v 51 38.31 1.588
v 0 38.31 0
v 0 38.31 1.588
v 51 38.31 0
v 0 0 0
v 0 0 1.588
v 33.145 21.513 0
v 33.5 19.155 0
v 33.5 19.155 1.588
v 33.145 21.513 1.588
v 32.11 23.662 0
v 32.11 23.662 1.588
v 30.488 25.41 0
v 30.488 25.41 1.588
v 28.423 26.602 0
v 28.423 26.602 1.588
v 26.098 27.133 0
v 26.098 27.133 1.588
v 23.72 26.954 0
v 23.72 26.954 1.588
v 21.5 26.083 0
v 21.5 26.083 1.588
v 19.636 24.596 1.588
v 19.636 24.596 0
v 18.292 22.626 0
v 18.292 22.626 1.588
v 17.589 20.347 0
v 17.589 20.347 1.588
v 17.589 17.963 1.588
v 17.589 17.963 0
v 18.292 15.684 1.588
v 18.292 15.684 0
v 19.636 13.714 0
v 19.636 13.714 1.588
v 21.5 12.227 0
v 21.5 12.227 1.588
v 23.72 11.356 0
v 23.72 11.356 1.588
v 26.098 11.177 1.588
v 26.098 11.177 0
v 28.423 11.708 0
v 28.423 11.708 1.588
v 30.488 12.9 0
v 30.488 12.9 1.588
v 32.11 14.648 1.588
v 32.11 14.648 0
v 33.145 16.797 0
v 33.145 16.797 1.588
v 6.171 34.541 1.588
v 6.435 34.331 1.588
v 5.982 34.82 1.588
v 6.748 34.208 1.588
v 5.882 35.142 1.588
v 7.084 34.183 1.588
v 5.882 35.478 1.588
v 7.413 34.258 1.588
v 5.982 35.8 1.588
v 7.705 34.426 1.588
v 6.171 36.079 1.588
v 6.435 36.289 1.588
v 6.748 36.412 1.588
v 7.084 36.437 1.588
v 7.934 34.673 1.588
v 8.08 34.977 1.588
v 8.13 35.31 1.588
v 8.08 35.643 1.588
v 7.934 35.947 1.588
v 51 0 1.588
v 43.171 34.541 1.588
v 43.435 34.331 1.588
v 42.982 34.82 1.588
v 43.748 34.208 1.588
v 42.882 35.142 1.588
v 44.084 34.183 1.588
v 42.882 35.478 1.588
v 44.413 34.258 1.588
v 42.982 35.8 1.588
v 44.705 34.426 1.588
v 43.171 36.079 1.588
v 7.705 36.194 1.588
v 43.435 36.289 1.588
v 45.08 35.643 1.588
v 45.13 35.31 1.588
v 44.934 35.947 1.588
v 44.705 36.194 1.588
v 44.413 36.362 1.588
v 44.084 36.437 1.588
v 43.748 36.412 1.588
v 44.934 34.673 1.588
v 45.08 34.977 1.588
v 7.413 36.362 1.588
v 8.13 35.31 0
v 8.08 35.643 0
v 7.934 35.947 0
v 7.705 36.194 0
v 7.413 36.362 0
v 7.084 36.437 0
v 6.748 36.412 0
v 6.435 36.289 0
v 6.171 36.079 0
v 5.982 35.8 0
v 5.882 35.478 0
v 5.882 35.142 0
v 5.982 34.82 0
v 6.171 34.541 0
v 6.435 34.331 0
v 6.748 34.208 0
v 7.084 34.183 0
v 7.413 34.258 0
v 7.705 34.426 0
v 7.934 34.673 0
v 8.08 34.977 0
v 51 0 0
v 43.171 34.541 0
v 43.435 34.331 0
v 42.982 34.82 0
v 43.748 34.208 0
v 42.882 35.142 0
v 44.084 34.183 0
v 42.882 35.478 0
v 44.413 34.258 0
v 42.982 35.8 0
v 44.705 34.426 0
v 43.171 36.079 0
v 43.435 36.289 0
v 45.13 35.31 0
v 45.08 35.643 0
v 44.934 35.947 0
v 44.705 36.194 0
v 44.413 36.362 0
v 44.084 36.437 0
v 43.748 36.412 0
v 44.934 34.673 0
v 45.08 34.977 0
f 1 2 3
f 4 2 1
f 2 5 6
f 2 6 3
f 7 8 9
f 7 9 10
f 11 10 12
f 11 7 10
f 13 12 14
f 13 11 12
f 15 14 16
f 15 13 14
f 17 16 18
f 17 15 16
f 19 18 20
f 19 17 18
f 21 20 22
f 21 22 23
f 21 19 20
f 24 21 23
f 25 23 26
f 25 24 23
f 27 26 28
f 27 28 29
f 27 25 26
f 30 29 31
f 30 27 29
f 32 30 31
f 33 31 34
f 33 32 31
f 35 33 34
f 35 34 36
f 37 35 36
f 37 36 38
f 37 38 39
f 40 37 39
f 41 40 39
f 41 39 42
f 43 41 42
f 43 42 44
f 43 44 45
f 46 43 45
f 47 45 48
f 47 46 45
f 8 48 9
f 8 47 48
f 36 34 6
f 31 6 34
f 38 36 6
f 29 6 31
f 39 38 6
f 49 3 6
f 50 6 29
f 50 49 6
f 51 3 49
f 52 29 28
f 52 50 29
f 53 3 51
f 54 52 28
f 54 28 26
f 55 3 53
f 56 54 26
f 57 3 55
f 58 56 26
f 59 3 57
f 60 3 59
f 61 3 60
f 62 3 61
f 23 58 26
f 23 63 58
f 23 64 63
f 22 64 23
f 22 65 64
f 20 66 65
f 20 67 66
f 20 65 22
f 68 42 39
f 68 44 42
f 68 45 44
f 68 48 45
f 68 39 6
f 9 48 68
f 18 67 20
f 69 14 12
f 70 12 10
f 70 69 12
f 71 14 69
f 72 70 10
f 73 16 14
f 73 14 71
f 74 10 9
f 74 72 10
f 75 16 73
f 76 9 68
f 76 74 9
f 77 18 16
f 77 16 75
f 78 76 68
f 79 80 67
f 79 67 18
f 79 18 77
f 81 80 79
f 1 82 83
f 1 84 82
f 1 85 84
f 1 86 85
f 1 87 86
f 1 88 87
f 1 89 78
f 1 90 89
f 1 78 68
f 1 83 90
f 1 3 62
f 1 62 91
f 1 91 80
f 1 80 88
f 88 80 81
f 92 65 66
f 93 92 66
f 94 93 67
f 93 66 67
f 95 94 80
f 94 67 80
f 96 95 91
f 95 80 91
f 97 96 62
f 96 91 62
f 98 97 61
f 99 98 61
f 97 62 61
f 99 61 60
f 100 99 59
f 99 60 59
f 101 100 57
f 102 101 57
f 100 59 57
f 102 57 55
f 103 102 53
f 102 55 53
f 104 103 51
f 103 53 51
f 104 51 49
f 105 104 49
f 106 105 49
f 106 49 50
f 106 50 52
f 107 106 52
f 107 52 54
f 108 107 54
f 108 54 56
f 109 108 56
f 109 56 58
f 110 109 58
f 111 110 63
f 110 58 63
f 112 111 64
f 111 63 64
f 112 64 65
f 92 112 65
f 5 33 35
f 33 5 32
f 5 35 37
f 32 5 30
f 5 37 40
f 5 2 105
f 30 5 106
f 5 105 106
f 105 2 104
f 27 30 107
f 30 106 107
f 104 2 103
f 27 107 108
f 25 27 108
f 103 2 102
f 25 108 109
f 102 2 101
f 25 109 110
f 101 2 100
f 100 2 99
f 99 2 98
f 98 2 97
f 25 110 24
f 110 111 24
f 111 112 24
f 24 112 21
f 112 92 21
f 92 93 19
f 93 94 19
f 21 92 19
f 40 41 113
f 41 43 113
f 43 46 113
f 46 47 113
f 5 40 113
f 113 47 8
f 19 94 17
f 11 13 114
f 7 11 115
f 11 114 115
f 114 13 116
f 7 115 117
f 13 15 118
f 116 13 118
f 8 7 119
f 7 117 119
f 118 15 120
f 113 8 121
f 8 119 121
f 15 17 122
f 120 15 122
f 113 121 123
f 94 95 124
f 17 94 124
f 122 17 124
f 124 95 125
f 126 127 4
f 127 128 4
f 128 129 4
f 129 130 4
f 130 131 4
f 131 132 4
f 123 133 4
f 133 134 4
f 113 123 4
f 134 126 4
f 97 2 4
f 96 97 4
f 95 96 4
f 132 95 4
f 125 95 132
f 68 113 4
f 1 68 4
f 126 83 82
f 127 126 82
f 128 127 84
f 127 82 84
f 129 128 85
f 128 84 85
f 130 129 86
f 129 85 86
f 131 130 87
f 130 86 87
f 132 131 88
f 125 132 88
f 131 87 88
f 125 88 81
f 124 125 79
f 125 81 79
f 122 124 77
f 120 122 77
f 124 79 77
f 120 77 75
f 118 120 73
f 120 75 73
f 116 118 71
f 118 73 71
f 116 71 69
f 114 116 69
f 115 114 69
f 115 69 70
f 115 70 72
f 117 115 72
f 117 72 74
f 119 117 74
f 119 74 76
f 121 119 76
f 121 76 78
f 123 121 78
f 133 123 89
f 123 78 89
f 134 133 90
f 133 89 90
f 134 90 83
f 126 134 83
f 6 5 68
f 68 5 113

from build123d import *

# Parameters (mm, degrees)
SKETCH1_W           = 51
SKETCH1_H           = 38.31
SKETCH1_R           = 8
BOSS_EXTRUDE1_DEPTH = 1.5875
SKETCH2_R           = 1.1303
CUT_EXTRUDE1_DEPTH  = 1.5875


with BuildPart() as part:
    # Sketch1 → Boss-Extrude1 (new body)
    with BuildSketch(Plane.XY):
        with Locations((25.5, 19.155)):
            Rectangle(SKETCH1_W, SKETCH1_H)
        with Locations((25.5, 19.155)):
            Circle(SKETCH1_R, mode=Mode.SUBTRACT)
    extrude(amount=BOSS_EXTRUDE1_DEPTH)

    # Sketch2 → Cut-Extrude1 (cut)
    with BuildSketch(Plane.XY.offset(1.5875)):
        with Locations((44, 35.31)):
            Circle(SKETCH2_R)
        with Locations((7, 35.31)):
            Circle(SKETCH2_R)
    extrude(amount=-CUT_EXTRUDE1_DEPTH, mode=Mode.SUBTRACT)


solid = part.part
